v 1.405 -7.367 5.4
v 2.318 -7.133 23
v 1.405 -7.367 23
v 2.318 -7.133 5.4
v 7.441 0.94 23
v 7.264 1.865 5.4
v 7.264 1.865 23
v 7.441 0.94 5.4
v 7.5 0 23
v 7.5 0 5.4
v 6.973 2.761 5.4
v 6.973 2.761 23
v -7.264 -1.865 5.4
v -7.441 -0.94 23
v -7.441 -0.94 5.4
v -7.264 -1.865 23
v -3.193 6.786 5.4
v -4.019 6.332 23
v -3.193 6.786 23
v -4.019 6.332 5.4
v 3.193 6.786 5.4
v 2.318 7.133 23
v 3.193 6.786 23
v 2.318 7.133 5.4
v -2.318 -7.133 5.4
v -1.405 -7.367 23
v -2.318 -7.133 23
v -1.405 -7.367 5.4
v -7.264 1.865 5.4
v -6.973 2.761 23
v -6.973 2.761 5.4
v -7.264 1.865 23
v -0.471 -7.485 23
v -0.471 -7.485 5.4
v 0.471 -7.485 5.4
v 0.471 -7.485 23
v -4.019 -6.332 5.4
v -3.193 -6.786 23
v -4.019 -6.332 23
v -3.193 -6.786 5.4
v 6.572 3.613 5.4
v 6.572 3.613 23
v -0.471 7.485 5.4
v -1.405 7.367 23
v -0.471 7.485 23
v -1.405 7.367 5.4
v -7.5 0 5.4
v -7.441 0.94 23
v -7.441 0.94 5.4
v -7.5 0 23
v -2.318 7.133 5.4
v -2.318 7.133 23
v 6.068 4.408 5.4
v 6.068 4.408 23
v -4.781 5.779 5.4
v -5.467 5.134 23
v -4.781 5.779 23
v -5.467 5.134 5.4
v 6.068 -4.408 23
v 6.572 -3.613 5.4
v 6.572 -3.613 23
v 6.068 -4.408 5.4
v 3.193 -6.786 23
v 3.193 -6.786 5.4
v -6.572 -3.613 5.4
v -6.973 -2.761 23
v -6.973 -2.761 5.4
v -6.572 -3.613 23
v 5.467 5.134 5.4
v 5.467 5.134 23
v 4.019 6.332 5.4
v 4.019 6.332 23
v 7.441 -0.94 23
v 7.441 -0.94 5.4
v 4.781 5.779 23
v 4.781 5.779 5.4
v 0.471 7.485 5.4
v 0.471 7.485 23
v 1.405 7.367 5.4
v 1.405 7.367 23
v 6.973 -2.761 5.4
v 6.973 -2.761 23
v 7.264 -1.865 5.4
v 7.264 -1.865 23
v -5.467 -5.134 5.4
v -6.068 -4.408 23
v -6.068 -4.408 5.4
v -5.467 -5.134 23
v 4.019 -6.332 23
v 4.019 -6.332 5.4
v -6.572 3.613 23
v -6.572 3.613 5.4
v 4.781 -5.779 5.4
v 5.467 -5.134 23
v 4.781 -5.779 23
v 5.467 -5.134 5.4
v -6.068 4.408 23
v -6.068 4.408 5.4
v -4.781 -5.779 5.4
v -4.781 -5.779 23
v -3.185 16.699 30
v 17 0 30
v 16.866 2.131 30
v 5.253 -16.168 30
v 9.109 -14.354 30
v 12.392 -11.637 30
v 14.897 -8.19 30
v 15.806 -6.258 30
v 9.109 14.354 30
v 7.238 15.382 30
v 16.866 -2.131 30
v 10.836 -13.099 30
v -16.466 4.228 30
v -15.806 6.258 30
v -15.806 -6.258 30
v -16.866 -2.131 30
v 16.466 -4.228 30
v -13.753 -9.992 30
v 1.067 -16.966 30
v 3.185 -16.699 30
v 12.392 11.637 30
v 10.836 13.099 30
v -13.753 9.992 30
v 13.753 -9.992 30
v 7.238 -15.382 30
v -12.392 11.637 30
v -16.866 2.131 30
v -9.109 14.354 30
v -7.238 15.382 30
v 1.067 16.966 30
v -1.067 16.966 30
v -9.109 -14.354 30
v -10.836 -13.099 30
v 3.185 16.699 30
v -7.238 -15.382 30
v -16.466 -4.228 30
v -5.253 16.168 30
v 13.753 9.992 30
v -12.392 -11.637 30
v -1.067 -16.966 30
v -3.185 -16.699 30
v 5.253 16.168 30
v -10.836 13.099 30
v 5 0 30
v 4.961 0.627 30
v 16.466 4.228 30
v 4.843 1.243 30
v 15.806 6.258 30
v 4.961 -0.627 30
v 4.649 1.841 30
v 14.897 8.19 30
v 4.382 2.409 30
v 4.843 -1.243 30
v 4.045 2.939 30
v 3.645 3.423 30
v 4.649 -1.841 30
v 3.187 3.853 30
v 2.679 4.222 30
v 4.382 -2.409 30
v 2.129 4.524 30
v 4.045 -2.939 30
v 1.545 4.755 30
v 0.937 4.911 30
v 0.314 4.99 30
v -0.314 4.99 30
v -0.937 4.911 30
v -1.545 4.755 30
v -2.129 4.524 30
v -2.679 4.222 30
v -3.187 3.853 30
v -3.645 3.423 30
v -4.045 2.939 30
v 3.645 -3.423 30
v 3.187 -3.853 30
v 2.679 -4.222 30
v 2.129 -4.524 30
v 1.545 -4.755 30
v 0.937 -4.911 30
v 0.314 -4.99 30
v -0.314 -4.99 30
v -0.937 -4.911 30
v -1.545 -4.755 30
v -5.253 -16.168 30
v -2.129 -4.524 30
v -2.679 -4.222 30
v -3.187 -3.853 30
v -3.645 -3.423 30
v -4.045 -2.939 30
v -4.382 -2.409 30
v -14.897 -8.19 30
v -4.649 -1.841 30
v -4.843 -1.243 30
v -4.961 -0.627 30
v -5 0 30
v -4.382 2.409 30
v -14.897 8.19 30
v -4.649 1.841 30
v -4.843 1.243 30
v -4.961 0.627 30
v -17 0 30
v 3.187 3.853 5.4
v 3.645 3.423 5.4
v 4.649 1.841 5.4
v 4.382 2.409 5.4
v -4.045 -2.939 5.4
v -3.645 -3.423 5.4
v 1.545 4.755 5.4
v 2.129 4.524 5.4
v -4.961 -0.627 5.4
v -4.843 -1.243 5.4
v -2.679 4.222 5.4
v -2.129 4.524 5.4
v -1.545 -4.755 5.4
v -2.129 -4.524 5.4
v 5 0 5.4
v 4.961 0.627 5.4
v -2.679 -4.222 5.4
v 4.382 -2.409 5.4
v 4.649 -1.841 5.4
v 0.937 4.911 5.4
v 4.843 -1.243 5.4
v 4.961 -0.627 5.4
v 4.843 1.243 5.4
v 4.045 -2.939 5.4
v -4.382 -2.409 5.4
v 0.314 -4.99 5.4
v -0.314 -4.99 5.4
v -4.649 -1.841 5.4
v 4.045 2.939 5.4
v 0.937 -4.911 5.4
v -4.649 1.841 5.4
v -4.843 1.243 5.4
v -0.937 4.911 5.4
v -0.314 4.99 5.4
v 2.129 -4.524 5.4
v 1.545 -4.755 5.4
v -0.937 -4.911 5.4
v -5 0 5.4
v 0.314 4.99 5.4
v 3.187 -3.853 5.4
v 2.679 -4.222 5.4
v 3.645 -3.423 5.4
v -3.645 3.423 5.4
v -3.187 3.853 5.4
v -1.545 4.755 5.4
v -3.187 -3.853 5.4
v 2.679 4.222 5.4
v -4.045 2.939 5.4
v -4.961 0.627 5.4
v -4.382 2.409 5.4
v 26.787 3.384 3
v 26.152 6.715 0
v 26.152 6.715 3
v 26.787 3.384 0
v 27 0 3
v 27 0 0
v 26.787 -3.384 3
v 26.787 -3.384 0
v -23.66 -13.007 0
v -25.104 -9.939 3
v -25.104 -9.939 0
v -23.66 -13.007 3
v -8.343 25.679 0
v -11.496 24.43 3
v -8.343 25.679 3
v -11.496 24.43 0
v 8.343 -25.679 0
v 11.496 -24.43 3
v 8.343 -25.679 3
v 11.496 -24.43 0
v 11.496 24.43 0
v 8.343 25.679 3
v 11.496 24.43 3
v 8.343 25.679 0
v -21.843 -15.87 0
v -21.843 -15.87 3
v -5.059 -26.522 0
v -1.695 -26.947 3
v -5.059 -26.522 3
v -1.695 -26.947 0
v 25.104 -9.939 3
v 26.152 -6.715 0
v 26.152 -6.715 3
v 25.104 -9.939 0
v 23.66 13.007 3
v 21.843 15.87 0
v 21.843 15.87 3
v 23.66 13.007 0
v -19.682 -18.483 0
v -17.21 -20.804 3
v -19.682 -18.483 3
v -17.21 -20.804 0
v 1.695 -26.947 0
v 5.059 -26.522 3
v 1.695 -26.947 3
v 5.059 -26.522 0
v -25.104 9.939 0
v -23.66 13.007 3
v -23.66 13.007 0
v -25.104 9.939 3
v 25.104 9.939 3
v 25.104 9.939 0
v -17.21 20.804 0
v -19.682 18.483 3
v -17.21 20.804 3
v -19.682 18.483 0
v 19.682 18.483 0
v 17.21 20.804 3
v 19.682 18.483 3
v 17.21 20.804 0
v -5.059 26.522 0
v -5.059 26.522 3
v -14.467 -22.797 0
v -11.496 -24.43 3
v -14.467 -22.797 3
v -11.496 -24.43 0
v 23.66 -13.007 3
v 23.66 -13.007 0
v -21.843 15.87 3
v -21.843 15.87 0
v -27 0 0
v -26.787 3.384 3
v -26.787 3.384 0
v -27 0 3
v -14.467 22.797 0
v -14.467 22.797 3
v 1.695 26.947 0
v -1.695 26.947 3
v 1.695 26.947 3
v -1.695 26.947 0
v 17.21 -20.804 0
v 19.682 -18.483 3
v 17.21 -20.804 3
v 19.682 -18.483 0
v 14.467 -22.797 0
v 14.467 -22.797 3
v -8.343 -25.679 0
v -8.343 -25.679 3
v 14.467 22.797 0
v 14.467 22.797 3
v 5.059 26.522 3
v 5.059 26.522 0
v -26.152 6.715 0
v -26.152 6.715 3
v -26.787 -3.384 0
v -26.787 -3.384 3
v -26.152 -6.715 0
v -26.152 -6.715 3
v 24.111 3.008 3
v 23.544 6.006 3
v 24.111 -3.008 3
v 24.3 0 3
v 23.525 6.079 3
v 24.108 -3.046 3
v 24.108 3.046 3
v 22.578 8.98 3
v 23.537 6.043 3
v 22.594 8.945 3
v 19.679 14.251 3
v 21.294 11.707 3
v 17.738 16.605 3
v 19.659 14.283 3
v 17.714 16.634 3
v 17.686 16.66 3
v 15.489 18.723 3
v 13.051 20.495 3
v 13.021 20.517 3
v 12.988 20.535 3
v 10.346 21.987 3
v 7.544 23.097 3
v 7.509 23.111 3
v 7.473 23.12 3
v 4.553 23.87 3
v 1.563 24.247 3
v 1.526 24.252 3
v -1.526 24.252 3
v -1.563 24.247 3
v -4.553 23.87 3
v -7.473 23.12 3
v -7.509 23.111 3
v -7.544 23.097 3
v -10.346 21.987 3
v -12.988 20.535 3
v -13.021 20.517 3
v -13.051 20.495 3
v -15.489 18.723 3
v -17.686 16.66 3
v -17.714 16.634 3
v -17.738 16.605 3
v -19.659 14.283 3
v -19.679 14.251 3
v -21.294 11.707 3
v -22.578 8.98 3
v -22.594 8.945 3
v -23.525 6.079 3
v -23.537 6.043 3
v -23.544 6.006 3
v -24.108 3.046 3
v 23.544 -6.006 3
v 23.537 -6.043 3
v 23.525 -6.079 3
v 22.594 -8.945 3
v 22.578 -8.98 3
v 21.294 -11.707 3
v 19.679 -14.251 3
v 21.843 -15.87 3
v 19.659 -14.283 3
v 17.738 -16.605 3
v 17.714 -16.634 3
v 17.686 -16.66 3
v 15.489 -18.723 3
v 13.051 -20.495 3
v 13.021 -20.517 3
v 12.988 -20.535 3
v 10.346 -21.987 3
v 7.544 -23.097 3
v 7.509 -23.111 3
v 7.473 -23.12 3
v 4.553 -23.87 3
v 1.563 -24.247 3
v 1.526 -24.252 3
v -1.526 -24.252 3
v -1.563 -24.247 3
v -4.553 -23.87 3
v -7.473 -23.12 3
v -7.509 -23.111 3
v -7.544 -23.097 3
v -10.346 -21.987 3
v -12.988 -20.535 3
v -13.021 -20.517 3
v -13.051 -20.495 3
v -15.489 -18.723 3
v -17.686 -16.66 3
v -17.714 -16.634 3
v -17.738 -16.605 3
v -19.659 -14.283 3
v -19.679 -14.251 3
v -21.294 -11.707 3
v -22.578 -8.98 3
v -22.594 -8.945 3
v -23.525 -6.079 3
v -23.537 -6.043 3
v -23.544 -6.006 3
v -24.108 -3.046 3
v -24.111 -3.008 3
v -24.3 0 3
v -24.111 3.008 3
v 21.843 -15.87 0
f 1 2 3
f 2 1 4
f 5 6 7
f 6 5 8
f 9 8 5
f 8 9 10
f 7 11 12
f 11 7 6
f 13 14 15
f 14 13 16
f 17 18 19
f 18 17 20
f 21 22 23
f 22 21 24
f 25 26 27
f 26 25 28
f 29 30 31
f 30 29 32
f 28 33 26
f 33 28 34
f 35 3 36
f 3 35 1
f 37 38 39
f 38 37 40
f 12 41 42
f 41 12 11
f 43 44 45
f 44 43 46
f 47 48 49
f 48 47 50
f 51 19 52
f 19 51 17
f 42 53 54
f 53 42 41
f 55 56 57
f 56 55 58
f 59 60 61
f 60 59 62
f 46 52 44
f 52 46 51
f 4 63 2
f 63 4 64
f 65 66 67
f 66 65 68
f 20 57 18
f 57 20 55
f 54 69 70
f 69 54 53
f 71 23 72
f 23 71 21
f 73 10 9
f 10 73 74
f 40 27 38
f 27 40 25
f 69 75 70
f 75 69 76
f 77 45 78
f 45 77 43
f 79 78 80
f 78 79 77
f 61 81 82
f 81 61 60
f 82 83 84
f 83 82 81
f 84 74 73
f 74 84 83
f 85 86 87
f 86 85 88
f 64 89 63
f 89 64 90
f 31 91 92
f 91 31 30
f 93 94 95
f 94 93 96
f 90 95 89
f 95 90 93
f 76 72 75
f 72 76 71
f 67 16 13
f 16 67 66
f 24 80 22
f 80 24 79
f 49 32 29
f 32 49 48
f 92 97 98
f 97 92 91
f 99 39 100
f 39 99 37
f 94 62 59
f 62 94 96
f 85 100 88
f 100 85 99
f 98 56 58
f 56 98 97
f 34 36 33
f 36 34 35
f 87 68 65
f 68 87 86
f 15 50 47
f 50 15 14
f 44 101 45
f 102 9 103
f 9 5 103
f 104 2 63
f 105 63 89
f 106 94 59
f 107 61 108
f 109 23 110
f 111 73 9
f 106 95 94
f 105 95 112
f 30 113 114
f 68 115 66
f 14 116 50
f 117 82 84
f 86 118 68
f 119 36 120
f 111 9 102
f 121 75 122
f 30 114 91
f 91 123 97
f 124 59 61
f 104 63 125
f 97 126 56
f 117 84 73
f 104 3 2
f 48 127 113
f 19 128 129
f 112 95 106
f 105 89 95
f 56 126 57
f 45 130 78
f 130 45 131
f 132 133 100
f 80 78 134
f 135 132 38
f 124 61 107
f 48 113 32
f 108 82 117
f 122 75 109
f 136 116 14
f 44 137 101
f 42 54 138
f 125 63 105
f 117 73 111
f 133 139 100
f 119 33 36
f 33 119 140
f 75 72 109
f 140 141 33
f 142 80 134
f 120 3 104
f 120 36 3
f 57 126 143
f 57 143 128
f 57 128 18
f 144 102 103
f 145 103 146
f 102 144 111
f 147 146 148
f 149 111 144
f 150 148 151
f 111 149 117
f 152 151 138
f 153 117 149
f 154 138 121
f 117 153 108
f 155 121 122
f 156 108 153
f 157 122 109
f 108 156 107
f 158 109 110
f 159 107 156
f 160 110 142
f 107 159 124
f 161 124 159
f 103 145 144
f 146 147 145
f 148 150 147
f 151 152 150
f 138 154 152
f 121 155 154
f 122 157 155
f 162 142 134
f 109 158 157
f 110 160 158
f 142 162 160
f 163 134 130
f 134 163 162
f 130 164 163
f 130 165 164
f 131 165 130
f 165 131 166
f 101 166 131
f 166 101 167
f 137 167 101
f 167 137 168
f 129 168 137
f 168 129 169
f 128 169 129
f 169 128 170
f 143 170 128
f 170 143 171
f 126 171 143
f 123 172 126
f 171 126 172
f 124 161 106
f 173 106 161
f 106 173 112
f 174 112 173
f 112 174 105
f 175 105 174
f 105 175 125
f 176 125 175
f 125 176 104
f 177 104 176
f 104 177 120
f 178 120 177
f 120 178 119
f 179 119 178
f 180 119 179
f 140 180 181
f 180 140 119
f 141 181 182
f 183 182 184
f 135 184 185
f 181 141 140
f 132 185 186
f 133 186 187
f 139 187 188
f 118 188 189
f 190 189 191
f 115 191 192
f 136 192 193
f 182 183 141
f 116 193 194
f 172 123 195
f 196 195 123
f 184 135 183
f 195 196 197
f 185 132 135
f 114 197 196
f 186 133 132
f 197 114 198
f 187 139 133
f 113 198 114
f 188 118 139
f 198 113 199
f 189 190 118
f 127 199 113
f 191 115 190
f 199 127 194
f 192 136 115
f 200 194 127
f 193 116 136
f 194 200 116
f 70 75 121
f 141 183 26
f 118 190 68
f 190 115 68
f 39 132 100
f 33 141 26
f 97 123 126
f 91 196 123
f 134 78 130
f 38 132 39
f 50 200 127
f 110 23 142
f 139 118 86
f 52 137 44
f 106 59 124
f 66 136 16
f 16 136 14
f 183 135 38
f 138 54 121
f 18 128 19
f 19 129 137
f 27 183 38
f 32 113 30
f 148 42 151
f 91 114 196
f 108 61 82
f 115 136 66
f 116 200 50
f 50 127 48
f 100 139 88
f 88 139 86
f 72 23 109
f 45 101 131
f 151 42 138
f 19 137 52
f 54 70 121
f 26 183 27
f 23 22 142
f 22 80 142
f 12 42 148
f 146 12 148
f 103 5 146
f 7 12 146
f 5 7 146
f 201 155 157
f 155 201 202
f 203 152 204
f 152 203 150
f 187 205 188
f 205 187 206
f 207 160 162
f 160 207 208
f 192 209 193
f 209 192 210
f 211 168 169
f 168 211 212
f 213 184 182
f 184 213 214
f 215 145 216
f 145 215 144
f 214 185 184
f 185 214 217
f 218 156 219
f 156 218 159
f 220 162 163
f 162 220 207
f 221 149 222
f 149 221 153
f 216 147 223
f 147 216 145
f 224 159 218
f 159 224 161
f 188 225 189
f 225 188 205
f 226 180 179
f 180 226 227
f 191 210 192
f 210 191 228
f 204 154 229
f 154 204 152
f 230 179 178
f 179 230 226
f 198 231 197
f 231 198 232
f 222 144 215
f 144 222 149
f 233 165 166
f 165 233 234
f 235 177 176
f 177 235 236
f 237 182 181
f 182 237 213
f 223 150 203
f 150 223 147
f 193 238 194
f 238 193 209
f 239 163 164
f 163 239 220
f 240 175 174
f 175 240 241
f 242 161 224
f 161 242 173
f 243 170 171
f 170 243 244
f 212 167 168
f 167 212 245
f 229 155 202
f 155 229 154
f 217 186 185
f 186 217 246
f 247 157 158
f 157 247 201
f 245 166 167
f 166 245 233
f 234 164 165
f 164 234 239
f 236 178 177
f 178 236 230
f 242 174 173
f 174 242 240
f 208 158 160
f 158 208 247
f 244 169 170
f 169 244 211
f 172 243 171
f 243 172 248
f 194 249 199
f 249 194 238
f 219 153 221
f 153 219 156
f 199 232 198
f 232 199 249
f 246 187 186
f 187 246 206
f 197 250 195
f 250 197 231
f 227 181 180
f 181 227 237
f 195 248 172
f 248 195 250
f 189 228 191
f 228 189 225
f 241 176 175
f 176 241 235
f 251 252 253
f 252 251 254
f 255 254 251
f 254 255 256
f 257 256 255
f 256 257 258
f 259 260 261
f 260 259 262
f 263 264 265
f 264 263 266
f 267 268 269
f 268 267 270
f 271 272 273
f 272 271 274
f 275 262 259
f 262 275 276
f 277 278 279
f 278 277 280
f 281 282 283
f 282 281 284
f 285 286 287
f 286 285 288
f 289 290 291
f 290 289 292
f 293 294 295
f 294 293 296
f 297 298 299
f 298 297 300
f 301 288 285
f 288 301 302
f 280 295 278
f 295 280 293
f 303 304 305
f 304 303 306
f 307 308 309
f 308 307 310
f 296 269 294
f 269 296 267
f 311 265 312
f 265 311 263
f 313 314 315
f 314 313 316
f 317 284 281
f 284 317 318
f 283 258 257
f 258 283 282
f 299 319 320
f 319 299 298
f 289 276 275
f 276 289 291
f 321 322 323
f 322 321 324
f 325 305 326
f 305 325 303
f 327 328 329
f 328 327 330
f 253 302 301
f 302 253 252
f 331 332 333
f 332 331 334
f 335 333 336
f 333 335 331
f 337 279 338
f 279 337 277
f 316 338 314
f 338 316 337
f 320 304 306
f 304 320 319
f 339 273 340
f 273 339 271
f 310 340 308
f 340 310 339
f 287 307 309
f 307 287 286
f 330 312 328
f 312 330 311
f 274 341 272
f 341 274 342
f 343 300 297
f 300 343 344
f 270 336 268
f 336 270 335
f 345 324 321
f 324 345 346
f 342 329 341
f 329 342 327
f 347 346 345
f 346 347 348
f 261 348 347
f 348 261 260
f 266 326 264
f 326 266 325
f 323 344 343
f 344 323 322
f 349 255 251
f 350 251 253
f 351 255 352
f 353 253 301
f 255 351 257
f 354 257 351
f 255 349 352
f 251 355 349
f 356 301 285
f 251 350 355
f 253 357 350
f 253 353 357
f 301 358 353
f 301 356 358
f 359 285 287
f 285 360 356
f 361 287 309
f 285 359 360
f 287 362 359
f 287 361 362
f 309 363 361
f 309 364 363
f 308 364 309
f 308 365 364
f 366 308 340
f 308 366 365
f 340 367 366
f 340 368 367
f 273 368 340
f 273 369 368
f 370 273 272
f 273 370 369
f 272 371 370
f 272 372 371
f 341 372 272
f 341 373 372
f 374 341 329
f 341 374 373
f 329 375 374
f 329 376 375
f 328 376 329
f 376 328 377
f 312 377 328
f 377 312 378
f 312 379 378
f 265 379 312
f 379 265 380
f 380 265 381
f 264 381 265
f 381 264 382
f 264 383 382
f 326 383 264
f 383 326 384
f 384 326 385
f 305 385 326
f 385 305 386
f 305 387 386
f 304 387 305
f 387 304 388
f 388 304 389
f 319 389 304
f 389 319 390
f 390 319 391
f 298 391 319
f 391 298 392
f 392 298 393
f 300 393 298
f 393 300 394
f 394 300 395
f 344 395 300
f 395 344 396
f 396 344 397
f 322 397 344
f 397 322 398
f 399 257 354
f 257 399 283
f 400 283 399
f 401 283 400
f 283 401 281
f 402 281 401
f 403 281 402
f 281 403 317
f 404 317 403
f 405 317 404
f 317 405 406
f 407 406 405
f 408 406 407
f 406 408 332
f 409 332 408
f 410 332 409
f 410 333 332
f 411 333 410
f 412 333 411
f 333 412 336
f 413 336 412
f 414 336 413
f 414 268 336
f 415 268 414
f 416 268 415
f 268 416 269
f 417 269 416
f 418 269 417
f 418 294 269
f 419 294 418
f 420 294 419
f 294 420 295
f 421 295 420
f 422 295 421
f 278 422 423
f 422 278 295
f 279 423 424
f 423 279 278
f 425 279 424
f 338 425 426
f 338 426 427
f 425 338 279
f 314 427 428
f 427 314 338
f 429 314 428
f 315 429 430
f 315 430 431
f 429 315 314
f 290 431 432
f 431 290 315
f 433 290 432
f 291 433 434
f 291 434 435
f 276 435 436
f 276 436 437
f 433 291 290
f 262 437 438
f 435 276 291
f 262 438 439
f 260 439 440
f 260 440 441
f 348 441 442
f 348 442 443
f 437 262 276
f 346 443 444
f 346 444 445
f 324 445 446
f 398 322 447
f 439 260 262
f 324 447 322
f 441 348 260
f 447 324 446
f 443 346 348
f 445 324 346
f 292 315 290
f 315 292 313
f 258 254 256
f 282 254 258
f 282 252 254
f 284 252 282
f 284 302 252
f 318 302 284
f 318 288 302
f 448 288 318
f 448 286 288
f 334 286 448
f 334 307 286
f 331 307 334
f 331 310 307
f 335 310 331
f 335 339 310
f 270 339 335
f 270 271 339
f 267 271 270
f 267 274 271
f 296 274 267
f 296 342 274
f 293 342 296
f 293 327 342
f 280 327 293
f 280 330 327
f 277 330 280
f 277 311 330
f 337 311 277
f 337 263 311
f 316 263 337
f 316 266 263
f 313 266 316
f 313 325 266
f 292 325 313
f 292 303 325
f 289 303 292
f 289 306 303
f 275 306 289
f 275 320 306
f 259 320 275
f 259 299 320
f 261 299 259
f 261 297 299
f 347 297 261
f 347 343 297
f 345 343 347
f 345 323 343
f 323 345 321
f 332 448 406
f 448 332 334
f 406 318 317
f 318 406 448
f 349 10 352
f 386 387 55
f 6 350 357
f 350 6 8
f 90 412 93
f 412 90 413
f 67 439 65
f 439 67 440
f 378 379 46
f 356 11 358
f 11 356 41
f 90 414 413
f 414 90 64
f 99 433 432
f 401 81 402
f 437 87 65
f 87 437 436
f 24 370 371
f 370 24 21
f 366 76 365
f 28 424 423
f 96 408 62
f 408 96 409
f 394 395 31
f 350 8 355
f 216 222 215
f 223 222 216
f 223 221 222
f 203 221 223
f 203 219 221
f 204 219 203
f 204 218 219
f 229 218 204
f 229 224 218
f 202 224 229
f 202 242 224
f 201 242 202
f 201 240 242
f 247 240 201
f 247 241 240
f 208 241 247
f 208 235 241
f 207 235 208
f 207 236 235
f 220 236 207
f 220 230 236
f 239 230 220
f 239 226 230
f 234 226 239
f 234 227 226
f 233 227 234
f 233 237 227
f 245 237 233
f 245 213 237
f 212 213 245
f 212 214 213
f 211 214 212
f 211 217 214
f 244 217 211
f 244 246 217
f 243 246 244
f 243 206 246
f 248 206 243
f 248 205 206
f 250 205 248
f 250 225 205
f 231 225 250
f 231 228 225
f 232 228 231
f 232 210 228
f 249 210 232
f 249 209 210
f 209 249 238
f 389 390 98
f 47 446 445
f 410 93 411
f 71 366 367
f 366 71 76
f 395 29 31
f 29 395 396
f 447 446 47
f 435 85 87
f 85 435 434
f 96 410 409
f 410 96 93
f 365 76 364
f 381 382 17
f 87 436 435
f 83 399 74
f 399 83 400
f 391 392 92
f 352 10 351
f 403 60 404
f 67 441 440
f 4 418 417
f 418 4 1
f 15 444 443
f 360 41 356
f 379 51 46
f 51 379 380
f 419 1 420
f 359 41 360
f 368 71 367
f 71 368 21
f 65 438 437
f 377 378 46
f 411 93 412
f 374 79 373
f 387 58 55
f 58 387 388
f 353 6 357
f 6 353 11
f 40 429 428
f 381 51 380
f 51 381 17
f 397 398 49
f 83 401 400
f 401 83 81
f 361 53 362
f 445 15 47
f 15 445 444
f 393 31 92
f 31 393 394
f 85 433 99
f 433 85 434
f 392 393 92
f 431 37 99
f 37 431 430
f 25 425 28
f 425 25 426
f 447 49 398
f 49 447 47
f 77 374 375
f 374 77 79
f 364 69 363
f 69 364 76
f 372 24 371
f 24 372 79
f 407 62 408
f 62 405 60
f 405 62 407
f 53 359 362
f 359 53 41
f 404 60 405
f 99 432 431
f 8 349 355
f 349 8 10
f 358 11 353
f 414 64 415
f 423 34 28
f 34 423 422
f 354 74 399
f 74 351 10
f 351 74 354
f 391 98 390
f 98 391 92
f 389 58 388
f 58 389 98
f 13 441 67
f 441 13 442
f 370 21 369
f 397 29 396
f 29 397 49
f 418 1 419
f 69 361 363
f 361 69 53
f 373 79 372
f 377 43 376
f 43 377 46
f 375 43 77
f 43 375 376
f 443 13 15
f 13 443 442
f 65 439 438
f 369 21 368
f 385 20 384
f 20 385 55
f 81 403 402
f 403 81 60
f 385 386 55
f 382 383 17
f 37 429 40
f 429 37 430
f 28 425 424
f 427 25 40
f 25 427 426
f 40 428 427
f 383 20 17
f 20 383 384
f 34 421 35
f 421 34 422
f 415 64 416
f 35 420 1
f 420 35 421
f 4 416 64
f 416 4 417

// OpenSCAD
$fn=50;

cylinder(3,r=27);
translate([0,0,2.9]) cylinder(2.5,r1=25,r2=7.5);

translate([0,0,3])
    difference() {
        union(){
        cylinder(22,r=7.5);
        translate([0,0,20]) cylinder(7,r1=7.5,r2=17);
        }
        cylinder(30,r=5);
    }
